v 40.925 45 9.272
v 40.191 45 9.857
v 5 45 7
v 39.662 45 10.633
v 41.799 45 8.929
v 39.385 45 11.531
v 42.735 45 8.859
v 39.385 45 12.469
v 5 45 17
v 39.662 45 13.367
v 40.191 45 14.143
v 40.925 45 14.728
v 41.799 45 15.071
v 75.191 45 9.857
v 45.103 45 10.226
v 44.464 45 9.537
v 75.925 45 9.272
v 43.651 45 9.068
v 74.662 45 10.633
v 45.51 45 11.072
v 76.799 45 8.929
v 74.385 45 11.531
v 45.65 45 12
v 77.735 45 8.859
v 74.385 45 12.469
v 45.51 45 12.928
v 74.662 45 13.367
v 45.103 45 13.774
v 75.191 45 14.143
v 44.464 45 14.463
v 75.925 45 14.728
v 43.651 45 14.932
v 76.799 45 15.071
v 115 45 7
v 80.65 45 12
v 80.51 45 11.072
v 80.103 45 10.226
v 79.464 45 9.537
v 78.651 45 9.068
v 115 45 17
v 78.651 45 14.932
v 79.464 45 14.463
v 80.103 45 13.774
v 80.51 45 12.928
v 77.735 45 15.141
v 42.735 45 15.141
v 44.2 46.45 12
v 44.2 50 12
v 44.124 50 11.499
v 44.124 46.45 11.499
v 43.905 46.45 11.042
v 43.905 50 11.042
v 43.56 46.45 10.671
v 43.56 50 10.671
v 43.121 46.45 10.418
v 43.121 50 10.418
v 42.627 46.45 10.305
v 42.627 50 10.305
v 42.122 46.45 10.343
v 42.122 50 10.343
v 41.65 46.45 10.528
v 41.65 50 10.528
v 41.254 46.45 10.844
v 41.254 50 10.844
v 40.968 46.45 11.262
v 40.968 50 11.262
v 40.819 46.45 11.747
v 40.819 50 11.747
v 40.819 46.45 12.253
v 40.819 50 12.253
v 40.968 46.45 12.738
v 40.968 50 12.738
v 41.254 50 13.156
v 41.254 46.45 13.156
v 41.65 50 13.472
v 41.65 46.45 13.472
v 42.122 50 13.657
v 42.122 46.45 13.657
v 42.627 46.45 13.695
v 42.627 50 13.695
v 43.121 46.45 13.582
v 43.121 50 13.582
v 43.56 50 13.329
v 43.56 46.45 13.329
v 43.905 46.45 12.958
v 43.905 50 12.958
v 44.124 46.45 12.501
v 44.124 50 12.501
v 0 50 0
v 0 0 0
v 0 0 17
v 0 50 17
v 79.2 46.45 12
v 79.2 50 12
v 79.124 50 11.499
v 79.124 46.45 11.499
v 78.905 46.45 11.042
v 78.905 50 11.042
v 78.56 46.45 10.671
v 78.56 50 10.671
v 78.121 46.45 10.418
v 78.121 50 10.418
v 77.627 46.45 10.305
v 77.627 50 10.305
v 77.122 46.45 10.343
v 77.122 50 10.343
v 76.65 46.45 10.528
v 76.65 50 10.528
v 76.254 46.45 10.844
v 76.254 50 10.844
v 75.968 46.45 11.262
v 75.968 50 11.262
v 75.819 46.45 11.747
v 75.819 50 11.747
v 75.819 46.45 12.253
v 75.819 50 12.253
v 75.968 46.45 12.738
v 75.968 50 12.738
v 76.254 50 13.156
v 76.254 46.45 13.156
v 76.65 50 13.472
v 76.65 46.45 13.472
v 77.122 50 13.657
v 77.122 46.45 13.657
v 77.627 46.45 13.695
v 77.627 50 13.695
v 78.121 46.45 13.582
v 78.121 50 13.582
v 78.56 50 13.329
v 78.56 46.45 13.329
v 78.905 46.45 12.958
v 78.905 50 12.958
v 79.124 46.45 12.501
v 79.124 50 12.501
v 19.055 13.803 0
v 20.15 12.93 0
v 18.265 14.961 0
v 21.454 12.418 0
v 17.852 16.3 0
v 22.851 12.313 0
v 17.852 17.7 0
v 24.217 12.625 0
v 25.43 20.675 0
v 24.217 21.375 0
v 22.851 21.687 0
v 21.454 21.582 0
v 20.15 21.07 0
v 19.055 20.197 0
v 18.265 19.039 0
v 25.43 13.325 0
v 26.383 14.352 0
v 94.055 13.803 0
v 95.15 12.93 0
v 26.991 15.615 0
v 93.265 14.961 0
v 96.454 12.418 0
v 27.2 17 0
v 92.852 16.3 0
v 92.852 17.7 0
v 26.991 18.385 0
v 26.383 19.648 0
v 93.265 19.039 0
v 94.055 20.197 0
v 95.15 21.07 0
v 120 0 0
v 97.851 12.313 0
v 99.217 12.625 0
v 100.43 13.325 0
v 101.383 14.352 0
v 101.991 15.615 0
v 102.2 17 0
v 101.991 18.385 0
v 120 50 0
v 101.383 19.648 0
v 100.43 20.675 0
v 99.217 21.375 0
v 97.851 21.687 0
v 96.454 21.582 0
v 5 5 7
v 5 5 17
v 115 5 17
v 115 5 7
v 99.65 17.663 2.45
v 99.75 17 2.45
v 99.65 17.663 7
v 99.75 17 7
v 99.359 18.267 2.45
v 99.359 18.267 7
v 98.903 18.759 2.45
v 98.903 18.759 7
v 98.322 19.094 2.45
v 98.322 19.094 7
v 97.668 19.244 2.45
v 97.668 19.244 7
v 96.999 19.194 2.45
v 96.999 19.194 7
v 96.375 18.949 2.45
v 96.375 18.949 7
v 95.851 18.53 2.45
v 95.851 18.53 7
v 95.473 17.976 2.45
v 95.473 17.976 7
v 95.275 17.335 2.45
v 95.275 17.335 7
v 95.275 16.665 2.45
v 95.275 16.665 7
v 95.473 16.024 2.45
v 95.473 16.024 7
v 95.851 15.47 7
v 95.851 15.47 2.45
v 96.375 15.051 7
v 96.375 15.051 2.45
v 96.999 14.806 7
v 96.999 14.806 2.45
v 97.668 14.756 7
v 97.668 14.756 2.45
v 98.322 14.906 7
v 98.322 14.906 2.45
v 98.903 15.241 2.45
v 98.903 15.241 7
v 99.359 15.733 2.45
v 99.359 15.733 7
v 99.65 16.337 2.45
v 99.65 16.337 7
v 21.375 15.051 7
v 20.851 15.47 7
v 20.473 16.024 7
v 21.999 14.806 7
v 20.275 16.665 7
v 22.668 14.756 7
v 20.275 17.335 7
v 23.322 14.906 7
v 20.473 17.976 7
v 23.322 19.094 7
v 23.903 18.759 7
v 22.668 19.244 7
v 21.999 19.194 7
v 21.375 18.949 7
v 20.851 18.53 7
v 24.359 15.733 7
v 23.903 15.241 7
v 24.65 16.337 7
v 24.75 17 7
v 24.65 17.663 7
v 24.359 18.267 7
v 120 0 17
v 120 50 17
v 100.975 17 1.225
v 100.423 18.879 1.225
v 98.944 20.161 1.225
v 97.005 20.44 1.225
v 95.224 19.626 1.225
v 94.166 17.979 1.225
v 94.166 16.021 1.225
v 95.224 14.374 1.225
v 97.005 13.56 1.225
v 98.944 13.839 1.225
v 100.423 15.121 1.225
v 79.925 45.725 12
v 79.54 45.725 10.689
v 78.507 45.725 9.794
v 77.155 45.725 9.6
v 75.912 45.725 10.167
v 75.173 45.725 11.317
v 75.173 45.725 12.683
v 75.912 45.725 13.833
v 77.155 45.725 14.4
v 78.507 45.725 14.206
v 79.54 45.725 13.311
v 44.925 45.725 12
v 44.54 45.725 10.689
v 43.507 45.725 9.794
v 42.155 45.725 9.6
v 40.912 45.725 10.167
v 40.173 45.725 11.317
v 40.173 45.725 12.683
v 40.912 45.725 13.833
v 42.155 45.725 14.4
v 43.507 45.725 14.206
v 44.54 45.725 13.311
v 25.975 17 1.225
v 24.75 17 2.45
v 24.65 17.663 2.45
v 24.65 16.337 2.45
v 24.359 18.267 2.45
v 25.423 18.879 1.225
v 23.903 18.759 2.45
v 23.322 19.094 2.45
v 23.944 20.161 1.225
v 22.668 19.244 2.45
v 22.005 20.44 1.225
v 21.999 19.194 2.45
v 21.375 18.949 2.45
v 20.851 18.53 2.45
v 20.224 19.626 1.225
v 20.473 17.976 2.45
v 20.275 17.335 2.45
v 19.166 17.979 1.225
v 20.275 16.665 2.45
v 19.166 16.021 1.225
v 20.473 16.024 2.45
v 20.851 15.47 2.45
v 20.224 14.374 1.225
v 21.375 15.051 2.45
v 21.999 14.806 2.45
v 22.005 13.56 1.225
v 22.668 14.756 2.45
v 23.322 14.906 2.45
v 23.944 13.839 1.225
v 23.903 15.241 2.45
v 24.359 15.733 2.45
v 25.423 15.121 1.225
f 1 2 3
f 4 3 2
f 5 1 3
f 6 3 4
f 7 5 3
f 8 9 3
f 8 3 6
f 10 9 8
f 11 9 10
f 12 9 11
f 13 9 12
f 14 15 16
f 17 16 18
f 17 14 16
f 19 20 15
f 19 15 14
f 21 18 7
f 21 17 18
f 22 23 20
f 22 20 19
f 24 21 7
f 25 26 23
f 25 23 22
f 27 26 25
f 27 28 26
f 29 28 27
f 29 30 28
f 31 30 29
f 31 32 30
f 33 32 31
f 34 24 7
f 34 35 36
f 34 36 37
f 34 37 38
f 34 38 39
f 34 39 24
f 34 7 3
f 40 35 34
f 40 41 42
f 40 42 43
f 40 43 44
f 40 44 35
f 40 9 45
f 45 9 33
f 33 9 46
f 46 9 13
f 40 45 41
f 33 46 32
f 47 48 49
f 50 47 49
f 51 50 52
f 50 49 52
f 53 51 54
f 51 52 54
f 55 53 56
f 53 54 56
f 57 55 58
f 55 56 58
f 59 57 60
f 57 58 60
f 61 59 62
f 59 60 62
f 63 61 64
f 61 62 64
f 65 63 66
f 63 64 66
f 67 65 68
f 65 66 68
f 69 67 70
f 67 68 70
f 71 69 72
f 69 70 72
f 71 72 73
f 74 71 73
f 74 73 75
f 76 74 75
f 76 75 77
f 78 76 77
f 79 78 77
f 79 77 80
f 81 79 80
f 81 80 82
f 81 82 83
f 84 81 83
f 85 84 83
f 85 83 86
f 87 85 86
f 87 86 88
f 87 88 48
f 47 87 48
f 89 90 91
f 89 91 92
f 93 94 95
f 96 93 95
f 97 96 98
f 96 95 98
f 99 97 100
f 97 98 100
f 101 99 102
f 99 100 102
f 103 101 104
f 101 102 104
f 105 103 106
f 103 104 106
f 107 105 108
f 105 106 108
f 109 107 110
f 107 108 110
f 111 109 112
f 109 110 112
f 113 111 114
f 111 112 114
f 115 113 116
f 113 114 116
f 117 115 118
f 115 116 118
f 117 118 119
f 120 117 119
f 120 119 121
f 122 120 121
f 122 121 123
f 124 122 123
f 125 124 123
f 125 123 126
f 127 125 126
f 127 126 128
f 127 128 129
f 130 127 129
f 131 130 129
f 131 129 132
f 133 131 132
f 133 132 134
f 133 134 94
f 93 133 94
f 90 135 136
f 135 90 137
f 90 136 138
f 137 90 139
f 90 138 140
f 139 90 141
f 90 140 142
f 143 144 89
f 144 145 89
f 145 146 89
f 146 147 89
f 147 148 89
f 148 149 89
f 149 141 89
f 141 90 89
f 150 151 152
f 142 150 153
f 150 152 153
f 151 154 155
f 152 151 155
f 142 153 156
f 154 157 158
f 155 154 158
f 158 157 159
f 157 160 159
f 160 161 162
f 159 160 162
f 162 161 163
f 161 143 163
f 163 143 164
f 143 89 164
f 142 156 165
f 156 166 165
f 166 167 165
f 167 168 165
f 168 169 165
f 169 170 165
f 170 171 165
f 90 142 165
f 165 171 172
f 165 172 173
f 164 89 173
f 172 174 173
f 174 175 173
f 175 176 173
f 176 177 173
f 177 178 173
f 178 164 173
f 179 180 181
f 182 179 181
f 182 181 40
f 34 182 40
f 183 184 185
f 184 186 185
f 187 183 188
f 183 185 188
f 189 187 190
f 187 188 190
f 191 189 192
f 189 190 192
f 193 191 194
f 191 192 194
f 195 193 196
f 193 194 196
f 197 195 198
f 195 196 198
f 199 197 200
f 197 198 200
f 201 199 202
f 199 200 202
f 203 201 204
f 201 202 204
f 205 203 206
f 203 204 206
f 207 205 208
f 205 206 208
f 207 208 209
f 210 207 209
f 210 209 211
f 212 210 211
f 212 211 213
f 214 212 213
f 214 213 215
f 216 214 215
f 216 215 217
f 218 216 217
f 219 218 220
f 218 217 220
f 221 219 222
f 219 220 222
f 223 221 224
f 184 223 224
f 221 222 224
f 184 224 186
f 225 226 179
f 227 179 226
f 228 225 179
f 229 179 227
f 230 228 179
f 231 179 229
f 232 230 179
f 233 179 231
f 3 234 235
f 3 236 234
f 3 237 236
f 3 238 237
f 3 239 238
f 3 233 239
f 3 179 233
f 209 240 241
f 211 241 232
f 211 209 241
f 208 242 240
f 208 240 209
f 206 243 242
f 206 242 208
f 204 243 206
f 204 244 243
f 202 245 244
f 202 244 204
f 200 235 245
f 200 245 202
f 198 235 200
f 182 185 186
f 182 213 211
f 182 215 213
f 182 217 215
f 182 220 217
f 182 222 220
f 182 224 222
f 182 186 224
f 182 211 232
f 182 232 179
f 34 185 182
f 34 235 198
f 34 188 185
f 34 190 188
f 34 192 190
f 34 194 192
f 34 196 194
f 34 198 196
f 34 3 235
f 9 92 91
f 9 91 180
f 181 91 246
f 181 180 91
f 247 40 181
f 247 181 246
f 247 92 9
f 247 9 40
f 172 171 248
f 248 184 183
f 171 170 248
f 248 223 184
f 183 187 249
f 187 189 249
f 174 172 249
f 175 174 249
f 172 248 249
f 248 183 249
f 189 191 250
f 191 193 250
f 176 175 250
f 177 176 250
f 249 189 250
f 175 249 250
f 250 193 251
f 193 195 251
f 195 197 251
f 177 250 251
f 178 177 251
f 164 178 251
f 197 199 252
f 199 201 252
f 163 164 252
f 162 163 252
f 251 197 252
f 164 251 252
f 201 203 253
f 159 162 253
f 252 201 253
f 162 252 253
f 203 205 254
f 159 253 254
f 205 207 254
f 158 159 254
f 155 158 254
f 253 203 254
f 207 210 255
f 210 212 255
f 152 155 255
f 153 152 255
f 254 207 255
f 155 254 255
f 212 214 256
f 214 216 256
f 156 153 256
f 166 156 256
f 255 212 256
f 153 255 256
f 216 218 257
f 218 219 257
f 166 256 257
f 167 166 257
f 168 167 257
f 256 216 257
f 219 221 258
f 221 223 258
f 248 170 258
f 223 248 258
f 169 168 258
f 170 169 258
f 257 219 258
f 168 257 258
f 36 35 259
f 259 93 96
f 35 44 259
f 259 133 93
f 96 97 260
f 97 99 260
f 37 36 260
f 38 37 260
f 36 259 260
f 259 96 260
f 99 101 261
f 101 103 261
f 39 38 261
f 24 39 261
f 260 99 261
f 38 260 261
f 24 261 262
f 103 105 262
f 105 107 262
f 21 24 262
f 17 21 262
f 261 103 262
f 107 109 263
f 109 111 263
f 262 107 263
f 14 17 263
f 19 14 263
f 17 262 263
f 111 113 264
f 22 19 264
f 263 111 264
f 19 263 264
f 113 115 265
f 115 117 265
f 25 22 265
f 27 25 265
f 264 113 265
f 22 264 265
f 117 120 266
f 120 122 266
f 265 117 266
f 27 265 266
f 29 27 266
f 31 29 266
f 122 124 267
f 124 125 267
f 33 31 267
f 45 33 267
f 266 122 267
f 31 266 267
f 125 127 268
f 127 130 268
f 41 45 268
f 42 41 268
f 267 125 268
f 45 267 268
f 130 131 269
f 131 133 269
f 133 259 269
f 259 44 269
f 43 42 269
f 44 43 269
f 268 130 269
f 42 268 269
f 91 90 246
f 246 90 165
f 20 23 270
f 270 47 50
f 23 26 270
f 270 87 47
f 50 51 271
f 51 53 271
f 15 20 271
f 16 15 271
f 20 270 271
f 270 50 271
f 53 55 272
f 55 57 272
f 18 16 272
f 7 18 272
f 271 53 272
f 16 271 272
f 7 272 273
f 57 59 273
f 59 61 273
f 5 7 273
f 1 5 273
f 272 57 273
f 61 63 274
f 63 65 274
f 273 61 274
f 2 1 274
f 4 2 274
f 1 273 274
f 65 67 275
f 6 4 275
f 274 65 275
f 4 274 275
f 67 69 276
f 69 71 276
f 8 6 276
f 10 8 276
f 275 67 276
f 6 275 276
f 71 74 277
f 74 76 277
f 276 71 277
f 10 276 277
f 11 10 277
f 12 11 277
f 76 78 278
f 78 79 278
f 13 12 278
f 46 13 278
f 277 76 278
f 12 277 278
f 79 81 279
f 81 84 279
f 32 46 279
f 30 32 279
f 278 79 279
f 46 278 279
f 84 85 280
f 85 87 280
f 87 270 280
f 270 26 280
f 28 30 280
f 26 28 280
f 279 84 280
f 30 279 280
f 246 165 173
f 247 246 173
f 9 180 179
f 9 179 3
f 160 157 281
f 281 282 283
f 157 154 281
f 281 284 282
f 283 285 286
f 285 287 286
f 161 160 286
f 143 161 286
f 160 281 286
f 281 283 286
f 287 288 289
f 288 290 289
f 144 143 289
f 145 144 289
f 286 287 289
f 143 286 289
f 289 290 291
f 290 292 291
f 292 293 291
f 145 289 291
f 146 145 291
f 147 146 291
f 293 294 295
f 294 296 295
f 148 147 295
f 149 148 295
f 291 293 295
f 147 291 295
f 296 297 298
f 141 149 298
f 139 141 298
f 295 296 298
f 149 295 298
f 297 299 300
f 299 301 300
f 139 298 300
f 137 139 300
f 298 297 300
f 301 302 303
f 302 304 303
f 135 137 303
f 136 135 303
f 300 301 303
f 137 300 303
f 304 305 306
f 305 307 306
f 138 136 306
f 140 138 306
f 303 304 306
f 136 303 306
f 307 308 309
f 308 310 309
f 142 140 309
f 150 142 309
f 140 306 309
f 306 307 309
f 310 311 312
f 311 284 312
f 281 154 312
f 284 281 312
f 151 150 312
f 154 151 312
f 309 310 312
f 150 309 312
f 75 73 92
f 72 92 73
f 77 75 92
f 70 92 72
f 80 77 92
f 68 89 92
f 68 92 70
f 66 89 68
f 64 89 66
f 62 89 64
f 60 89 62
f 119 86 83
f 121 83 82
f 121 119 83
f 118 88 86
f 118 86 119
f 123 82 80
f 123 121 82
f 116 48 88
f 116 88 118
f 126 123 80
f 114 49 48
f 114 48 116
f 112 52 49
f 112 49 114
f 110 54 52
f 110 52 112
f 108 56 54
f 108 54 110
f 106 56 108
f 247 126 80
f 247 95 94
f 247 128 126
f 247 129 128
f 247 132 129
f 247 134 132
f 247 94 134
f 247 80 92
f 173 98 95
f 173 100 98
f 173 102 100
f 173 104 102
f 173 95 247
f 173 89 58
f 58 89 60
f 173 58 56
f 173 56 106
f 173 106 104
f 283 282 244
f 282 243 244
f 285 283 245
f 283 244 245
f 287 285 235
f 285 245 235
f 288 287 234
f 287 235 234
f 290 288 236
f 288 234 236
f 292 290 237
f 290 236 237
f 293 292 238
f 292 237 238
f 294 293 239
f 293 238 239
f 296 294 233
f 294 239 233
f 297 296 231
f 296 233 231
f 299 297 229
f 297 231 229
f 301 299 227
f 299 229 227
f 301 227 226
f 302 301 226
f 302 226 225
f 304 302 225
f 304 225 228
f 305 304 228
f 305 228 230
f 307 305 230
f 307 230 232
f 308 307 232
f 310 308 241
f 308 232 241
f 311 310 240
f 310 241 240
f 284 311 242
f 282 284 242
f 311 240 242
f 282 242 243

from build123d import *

# Parameters (mm, degrees)
SKETCH2_W                                       = 120
SKETCH2_H                                       = 50
BOSS_EXTRUDE3_DEPTH                             = 17
SKETCH4_W                                       = 110
SKETCH4_H                                       = 40
CUT_EXTRUDE1_DEPTH                              = 10
CSK_FOR_M3_FLAT_HEAD_MACHINE_SCREW1_D           = 3.4
CSK_FOR_M3_FLAT_HEAD_MACHINE_SCREW1_DEPTH       = 5
CSK_FOR_M3_FLAT_HEAD_MACHINE_SCREW1_CSINK_D     = 6.3
CSK_FOR_M3_FLAT_HEAD_MACHINE_SCREW1_CSINK_ANGLE = 90
CSK_FOR_M4_FLAT_HEAD_MACHINE_SCREW3_D           = 4.5
CSK_FOR_M4_FLAT_HEAD_MACHINE_SCREW3_CSINK_D     = 9.4
CSK_FOR_M4_FLAT_HEAD_MACHINE_SCREW3_CSINK_ANGLE = 90


with BuildPart() as part:
    # Sketch2 → Boss-Extrude3 (new body)
    with BuildSketch(Plane.XY):
        with Locations((60, 25)):
            Rectangle(SKETCH2_W, SKETCH2_H)
    extrude(amount=BOSS_EXTRUDE3_DEPTH)

    # Sketch4 → Cut-Extrude1 (cut)
    with BuildSketch(Plane.XY.offset(17)):
        with Locations((60, 25)):
            Rectangle(SKETCH4_W, SKETCH4_H)
    extrude(amount=-CUT_EXTRUDE1_DEPTH, mode=Mode.SUBTRACT)

    # CSK for M3 Flat Head Machine Screw1
    with Locations(Plane(origin=(0, 45, 0), x_dir=(-1, 0, 0), z_dir=(0, -1, 0))):
        with Locations((-42.5, -12), (-77.5, -12)):
            CounterSinkHole(CSK_FOR_M3_FLAT_HEAD_MACHINE_SCREW1_D / 2, CSK_FOR_M3_FLAT_HEAD_MACHINE_SCREW1_CSINK_D / 2, depth=CSK_FOR_M3_FLAT_HEAD_MACHINE_SCREW1_DEPTH, counter_sink_angle=CSK_FOR_M3_FLAT_HEAD_MACHINE_SCREW1_CSINK_ANGLE)

    # CSK for M4 Flat Head Machine Screw3 (through all)
    with Locations(Plane(origin=(0, 0, 0), x_dir=(-1, 0, 0), z_dir=(0, 0, -1))):
        with Locations((-97.5, 17), (-22.5, 17)):
            CounterSinkHole(CSK_FOR_M4_FLAT_HEAD_MACHINE_SCREW3_D / 2, CSK_FOR_M4_FLAT_HEAD_MACHINE_SCREW3_CSINK_D / 2, counter_sink_angle=CSK_FOR_M4_FLAT_HEAD_MACHINE_SCREW3_CSINK_ANGLE)


solid = part.part
